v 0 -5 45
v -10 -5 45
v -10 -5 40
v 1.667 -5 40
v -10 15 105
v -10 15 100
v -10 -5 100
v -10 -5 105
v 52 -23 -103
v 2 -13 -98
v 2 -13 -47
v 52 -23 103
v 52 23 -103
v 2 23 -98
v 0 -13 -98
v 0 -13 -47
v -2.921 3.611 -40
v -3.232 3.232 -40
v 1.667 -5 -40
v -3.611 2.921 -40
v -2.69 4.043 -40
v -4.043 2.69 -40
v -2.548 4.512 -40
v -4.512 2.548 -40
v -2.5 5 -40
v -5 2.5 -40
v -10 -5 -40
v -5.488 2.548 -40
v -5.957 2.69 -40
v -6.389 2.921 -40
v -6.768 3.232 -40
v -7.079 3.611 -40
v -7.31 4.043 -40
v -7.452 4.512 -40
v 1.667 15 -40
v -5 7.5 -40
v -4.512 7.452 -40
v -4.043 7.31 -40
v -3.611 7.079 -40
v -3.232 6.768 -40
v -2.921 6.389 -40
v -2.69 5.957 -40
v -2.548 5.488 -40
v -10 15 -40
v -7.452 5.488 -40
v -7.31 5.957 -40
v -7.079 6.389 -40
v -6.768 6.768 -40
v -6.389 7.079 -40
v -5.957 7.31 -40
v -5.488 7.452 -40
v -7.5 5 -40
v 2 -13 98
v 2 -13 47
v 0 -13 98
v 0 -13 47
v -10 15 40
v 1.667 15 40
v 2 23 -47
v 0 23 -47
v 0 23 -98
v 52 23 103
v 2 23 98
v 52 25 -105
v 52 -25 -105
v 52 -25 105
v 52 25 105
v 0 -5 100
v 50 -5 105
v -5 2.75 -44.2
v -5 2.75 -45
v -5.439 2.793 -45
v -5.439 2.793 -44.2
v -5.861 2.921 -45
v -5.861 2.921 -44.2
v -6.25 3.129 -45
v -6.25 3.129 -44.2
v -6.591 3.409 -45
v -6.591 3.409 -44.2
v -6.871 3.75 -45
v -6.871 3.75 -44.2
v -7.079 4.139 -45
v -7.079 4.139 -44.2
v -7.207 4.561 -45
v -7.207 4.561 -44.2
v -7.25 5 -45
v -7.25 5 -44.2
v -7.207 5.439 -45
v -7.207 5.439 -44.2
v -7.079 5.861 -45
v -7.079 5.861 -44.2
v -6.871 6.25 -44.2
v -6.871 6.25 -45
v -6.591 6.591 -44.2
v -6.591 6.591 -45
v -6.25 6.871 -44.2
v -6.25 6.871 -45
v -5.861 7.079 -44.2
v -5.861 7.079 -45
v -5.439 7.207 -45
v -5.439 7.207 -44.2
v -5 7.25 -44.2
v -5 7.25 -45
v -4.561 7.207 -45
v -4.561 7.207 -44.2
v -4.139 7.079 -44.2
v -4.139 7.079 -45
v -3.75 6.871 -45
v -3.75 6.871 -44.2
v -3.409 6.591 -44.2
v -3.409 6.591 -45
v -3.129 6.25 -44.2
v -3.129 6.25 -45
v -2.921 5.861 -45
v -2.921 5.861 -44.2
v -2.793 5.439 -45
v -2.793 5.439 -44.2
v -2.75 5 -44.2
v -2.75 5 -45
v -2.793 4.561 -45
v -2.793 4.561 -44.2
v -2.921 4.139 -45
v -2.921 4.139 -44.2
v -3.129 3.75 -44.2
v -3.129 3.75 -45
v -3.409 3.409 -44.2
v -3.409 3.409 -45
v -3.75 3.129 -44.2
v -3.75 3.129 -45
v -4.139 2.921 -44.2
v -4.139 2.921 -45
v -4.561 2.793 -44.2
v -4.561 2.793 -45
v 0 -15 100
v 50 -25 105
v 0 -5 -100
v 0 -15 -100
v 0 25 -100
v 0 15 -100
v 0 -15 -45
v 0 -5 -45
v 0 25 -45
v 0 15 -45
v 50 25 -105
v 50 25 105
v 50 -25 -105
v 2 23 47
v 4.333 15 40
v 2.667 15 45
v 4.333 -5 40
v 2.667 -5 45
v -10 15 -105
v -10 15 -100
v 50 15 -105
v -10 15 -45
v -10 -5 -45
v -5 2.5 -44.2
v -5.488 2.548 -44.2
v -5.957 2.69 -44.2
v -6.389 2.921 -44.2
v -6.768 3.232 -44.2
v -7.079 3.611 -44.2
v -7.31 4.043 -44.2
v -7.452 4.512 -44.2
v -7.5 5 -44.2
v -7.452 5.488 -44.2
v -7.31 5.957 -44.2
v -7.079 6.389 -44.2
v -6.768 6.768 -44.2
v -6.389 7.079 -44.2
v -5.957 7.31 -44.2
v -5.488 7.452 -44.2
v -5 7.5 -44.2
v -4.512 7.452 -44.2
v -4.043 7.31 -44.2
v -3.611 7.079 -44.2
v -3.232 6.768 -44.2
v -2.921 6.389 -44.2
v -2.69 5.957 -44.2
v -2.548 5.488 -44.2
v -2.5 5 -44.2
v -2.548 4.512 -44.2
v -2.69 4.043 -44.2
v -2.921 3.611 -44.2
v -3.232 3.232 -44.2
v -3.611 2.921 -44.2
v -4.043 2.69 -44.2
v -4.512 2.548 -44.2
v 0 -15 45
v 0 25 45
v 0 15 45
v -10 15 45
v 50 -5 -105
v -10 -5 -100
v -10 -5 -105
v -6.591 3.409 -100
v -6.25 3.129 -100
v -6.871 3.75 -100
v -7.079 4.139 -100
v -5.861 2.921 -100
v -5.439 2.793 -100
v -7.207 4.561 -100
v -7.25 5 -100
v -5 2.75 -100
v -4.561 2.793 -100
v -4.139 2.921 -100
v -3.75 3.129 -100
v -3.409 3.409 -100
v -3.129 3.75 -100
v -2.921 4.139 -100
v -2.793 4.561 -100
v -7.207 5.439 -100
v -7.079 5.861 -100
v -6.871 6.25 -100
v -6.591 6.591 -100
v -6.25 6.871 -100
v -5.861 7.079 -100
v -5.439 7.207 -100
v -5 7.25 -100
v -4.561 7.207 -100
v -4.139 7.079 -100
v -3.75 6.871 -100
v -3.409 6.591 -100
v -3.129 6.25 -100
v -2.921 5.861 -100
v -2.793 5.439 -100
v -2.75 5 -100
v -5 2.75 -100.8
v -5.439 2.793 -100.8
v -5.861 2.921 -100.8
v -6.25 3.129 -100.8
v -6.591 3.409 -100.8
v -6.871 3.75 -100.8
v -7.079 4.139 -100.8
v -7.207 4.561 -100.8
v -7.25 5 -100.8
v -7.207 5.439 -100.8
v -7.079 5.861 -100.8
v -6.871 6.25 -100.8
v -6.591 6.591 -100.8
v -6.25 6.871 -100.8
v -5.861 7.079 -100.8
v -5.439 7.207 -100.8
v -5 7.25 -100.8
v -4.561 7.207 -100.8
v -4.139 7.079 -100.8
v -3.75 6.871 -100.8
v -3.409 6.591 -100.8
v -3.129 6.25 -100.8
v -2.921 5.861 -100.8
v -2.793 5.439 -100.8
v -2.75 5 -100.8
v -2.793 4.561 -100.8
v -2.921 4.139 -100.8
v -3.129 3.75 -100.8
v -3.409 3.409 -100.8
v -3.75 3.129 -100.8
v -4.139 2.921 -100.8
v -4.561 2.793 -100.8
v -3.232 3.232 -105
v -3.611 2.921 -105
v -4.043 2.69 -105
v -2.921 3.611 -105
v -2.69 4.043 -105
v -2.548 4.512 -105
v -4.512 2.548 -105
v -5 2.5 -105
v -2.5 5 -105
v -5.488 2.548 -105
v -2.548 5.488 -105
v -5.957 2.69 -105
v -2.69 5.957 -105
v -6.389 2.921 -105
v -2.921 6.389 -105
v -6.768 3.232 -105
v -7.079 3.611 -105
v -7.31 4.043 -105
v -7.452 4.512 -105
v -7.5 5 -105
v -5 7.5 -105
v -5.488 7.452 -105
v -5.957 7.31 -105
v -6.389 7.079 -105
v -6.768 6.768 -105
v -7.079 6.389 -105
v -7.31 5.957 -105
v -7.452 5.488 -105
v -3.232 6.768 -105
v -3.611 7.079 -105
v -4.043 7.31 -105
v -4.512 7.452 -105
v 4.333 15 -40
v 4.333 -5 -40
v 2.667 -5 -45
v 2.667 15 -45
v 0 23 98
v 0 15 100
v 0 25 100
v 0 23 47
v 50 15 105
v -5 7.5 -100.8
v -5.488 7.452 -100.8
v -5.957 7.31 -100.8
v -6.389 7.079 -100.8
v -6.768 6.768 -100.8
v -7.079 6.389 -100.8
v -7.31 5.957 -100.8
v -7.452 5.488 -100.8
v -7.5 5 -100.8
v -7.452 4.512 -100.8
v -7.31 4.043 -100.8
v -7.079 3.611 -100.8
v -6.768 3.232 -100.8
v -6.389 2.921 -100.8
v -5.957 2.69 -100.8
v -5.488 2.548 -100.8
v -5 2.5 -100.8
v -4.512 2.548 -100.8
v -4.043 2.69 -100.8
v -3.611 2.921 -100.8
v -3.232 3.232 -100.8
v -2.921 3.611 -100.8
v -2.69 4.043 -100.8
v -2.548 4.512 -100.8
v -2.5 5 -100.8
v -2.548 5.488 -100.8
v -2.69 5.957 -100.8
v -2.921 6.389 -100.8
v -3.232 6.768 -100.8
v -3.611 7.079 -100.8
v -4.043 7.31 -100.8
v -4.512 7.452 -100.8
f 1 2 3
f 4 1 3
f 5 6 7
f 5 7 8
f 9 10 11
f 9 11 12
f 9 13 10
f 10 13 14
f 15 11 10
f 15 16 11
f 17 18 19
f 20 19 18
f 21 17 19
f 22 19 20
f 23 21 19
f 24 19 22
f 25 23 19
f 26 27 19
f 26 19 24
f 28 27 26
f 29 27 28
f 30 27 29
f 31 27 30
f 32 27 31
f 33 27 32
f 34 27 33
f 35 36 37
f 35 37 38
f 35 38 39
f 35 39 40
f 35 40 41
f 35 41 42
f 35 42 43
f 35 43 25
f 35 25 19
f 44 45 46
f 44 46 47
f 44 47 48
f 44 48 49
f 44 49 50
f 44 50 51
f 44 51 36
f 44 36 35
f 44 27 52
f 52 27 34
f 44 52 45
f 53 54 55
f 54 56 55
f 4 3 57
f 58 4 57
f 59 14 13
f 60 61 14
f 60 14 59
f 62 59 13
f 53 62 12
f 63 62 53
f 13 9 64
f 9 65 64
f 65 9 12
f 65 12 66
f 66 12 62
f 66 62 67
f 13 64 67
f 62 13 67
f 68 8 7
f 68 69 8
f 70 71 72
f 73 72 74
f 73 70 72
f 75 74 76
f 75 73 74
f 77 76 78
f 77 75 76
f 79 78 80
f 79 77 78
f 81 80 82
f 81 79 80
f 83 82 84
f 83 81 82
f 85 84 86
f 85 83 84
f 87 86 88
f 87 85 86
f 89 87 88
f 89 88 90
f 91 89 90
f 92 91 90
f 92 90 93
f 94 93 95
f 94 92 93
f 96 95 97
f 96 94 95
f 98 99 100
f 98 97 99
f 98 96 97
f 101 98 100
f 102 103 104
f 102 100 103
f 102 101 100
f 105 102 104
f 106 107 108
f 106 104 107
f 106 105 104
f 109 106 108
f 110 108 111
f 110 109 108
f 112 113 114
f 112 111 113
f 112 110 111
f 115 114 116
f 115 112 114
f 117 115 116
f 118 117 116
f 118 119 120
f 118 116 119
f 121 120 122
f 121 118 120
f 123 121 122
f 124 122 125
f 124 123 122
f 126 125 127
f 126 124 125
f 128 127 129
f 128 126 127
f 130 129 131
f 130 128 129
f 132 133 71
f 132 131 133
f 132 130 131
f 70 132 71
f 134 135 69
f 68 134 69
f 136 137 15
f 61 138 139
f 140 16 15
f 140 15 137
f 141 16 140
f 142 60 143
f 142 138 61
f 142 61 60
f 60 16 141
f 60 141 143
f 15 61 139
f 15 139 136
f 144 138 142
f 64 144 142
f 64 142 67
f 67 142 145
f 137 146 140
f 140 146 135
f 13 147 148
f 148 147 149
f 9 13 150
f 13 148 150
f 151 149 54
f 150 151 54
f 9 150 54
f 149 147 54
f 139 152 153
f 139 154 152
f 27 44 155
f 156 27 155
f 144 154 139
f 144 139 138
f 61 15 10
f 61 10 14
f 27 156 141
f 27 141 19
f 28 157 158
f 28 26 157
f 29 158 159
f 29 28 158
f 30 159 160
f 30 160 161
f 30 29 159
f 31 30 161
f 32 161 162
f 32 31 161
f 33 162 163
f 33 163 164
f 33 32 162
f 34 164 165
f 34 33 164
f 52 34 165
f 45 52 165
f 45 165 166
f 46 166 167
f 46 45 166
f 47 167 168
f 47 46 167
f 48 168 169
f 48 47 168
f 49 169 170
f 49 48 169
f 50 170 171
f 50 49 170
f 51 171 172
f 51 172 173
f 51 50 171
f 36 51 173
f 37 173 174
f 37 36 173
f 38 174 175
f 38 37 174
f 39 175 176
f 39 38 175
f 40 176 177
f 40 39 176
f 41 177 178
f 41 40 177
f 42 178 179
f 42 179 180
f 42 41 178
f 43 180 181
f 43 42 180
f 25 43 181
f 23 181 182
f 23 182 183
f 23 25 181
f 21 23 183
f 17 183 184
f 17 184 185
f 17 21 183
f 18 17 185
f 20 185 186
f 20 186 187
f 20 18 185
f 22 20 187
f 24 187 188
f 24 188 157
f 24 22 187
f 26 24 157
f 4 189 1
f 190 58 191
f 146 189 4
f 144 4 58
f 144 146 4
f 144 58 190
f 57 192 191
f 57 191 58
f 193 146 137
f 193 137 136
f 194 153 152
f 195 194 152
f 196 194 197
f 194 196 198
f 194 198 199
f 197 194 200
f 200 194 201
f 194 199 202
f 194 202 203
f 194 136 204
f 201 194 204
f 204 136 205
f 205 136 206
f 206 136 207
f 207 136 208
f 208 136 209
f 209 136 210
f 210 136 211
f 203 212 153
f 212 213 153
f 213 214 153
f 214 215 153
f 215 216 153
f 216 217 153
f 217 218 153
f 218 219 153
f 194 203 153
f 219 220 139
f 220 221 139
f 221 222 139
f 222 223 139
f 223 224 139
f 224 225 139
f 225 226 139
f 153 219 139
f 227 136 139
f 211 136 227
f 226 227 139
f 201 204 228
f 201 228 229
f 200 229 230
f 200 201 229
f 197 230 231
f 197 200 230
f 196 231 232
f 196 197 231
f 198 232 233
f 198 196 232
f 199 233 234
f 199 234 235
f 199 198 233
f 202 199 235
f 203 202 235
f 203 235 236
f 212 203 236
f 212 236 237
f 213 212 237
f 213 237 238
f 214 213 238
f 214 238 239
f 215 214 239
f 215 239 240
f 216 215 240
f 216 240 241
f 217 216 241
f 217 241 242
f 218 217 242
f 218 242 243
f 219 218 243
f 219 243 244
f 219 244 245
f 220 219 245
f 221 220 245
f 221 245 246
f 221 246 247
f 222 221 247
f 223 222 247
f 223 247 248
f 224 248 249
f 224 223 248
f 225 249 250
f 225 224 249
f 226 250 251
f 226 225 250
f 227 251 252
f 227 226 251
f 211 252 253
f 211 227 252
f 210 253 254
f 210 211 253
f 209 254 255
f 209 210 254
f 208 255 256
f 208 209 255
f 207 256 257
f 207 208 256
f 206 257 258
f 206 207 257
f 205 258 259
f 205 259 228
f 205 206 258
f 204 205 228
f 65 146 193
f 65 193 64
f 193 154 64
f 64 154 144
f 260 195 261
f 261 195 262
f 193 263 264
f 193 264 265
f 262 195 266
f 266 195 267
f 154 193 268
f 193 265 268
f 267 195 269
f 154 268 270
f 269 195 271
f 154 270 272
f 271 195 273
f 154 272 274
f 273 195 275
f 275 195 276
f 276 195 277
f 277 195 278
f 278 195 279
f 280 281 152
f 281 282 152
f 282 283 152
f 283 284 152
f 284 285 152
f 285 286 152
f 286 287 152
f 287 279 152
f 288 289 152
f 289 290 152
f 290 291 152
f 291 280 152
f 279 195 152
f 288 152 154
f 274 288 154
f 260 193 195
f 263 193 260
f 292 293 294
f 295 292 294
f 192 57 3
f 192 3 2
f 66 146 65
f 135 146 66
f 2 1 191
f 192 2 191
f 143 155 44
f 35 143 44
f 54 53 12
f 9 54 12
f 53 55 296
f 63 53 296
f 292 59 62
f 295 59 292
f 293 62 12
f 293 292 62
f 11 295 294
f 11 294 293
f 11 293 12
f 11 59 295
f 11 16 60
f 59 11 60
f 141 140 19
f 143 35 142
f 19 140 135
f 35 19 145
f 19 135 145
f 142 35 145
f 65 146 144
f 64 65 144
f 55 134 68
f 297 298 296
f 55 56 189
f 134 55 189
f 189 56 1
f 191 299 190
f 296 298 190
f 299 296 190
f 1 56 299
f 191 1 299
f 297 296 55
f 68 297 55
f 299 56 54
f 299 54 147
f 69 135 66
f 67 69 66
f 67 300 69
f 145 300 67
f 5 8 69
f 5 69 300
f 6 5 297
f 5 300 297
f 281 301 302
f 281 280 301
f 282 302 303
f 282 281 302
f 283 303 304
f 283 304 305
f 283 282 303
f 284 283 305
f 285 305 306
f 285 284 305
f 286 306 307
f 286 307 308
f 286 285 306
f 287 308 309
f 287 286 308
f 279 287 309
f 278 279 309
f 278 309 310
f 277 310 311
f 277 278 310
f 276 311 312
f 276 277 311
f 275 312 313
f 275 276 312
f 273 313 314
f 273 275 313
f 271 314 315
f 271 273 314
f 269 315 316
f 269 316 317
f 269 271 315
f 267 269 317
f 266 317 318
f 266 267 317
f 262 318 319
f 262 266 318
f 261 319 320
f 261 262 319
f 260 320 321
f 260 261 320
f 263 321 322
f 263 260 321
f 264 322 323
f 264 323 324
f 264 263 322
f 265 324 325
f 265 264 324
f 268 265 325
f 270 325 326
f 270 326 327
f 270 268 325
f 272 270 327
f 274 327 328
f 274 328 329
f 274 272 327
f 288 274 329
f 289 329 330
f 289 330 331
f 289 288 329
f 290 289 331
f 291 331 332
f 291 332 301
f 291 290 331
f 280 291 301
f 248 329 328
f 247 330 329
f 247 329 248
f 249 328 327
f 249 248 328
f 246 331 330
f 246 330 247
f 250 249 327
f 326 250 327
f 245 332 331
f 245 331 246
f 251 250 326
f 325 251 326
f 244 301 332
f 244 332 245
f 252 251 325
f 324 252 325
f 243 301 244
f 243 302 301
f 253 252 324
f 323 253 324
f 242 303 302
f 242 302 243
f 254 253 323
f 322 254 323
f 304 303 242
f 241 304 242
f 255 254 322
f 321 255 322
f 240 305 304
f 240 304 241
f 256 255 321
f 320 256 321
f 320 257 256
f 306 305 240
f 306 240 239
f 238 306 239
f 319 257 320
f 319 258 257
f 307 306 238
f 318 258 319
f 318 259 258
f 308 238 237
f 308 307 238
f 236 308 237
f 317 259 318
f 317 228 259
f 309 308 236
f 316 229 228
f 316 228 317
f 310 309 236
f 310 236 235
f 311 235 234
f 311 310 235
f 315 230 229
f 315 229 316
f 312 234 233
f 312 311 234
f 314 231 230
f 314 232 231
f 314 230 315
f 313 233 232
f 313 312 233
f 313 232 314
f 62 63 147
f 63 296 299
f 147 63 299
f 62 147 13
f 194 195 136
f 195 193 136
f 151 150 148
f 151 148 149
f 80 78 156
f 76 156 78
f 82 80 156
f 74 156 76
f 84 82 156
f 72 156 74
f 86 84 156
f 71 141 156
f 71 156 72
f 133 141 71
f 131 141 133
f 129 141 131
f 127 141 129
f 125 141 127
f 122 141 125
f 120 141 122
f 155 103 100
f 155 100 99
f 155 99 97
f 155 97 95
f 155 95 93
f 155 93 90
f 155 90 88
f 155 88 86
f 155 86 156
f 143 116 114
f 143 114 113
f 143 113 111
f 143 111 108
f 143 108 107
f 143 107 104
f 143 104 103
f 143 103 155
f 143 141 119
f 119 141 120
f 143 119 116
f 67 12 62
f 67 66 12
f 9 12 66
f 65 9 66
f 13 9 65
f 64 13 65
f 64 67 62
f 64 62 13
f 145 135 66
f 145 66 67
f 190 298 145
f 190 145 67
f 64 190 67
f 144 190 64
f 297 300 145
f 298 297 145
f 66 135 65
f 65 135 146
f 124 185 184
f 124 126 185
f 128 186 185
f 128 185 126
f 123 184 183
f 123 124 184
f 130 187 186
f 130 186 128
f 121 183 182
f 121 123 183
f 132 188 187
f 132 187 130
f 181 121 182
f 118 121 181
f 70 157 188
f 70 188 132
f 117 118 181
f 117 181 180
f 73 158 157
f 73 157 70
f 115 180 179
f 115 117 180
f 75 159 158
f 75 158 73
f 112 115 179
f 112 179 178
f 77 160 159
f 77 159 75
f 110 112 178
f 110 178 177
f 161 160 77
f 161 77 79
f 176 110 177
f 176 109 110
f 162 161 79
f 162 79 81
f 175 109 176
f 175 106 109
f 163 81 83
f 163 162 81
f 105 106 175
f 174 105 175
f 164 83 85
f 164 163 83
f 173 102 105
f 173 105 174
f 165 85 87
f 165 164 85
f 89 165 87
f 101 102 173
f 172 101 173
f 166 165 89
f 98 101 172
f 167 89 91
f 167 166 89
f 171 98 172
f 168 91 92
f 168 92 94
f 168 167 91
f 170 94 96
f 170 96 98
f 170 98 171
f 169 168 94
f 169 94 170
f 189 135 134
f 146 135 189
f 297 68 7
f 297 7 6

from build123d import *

# Parameters (mm, degrees)
SKETCH1_W             = 210
SKETCH1_H             = 50
SKETCH1_W_2           = 206
SKETCH1_H_2           = 46
BOSS_EXTRUDE3_DEPTH   = 52
SKETCH3_W             = 210
SKETCH3_H             = 50
BOSS_EXTRUDE4_DEPTH   = 2
CHAMFER1_SIZE         = 50
CHAMFER1_SIZE_2       = 5
CHAMFER2_SIZE         = 10
CHAMFER2_SIZE_2       = 50
CHAMFER3_SIZE2        = 150
CHAMFER3_SIZE         = 50
CHAMFER4_SIZE         = 150
CHAMFER4_SIZE2        = 50
CHAMFER5_SIZE         = 10
CHAMFER5_SIZE2        = 50
CHAMFER6_SIZE         = 5
CHAMFER6_SIZE2        = 50
SKETCH4_W             = 51
SKETCH4_H             = 36
CUT_EXTRUDE2_DEPTH    = 2
SKETCH5_W             = 5
SKETCH5_H             = 20
BOSS_EXTRUDE5_DEPTH   = 10
BOSS_EXTRUDE5_2_DEPTH = 10
SKETCH6_W             = 5
SKETCH6_H             = 20
BOSS_EXTRUDE6_DEPTH   = 52
CUT_EXTRUDE3_DEPTH    = 36


# Some blends are built 0.0001 mm under size
with BuildPart() as part:
    # Sketch1 → Boss-Extrude3 (new body)
    with BuildSketch(Plane(origin=(0, 0, 0), x_dir=(0, 0, -1), z_dir=(1, 0, 0))):
        Rectangle(SKETCH1_W, SKETCH1_H)
        Rectangle(SKETCH1_W_2, SKETCH1_H_2, mode=Mode.SUBTRACT)
    extrude(amount=BOSS_EXTRUDE3_DEPTH)

    # Sketch3 → Boss-Extrude4 (add)
    with BuildSketch(Plane.ZY):
        Rectangle(SKETCH3_W, SKETCH3_H)
    extrude(amount=-BOSS_EXTRUDE4_DEPTH)

    # Chamfer1
    # the kernel refuses this chamfer: 50, 5 mm, written as the material it adds along each edge
    with BuildSketch(Plane(origin=(2, 23, 103), x_dir=(0.9999926740665032, 0, 0.0038277687135160926), z_dir=(0, -1, 0))) as chamfer1_piece_1_section:
        Polygon((CHAMFER1_SIZE * 0.999992674067, -CHAMFER1_SIZE * 0.00382776871352), (-CHAMFER1_SIZE_2 * 0.00382776871352, -CHAMFER1_SIZE_2 * 0.999992674067), (0, 0), align=None)
    chamfer1_piece_1 = extrude(amount=46, mode=Mode.PRIVATE)
    chamfer1_piece_1 = split(chamfer1_piece_1, bisect_by=Plane(origin=(52, 0, 101.896942332), z_dir=(-1, 0, 0)), keep=Keep.TOP, mode=Mode.PRIVATE)
    add(chamfer1_piece_1)

    # Chamfer2
    # the kernel refuses this chamfer: 50, 10 mm, written as the material it adds along each edge
    with BuildSketch(Plane(origin=(2, -23, 227.906604315), x_dir=(-0.18544098588999025, 0.9826554028509427, 0), z_dir=(0, 0, -1))) as chamfer2_piece_1_section:
        Polygon((CHAMFER2_SIZE * 0.982655402851, CHAMFER2_SIZE * 0.18544098589), (-CHAMFER2_SIZE_2 * 0.18544098589, CHAMFER2_SIZE_2 * 0.982655402851), (0, 0), align=None)
    chamfer2_piece_1 = extrude(amount=330.906604315, mode=Mode.PRIVATE)
    chamfer2_piece_1 = split(chamfer2_piece_1, bisect_by=Plane(origin=(9.567041137, -20.198584672, 98.756704114), z_dir=(0.09950371902147655, 0, -0.9950371902099414)), keep=Keep.TOP, mode=Mode.PRIVATE)
    chamfer2_piece_1 = split(chamfer2_piece_1, bisect_by=Plane(origin=(52, -20.198584672, -1.619765595), z_dir=(-1, 0, 0)), keep=Keep.TOP, mode=Mode.PRIVATE)
    add(chamfer2_piece_1)

    # Chamfer3
    chamfer3_edges = [part.edges().sort_by_distance(p)[0] for p in [
        (2, 5, -103),
    ]]
    chamfer3_side = [part.faces().sort_by_distance(p)[0] for p in [
        (3, 5, -103),
    ]]
    chamfer(chamfer3_edges, length=CHAMFER3_SIZE - 0.0001, length2=CHAMFER3_SIZE2 - 0.0001, reference=chamfer3_side[0])  # a hair under: the kernel refuses the full size

    # Chamfer4
    chamfer4_edges = [part.edges().sort_by_distance(p)[0] for p in [
        (0, 0, -105),
    ]]
    chamfer4_side = [part.faces().sort_by_distance(p)[0] for p in [
        (0, 0, 0),
    ]]
    chamfer(chamfer4_edges, length=CHAMFER4_SIZE, length2=CHAMFER4_SIZE2, reference=chamfer4_side[0])

    # Chamfer5
    chamfer5_edges = [part.edges().sort_by_distance(p)[0] for p in [
        (0, -25, 75),
    ]]
    chamfer5_side = [part.faces().sort_by_distance(p)[0] for p in [
        (0, 0, 75),
    ]]
    chamfer(chamfer5_edges, length=CHAMFER5_SIZE, length2=CHAMFER5_SIZE2, reference=chamfer5_side[0])

    # Chamfer6
    chamfer6_edges = [part.edges().sort_by_distance(p)[0] for p in [
        (0, 5, 105),
    ]]
    chamfer6_side = [part.faces().sort_by_distance(p)[0] for p in [
        (0, 5, 75),
    ]]
    chamfer(chamfer6_edges, length=CHAMFER6_SIZE, length2=CHAMFER6_SIZE2, reference=chamfer6_side[0])

    # Sketch4 → Cut-Extrude2 (cut)
    with BuildSketch(Plane.ZY):
        with Locations((72.5, 5)):
            Rectangle(SKETCH4_W, SKETCH4_H)
    extrude(amount=-CUT_EXTRUDE2_DEPTH, mode=Mode.SUBTRACT)



with BuildPart() as body_2:
    # Sketch5 → Boss-Extrude5 (new body)
    with BuildSketch(Plane.ZY):
        with Locations((102.5, 5)):
            Rectangle(SKETCH5_W, SKETCH5_H)
    extrude(amount=BOSS_EXTRUDE5_DEPTH)


with BuildPart() as body_3:
    # Sketch5 → Boss-Extrude5 2 (new body)
    with BuildSketch(Plane.ZY):
        with Locations((42.5, 5)):
            Rectangle(SKETCH5_W, SKETCH5_H)
    extrude(amount=BOSS_EXTRUDE5_2_DEPTH)


with BuildPart() as part_1:
    add(part.part)

    add(body_2.part)  # Boss-Extrude6 merges body 2

    add(body_3.part)  # Boss-Extrude6 merges body 3
    # Sketch6 → Boss-Extrude6 (add)
    with BuildSketch(Plane(origin=(0, 0, 0), x_dir=(0, 0, -1), z_dir=(1, 0, 0))):
        with Locations((-42.5, 5)):
            Rectangle(SKETCH6_W, SKETCH6_H)
        with Locations((-102.5, 5)):
            Rectangle(SKETCH6_W, SKETCH6_H)
    extrude(amount=BOSS_EXTRUDE6_DEPTH)

    # Sketch7 → Cut-Extrude3 (cut)
    with BuildSketch(Plane(origin=(0, -13, 0), x_dir=(1, 0, 0), z_dir=(0, 1, 0))):
        Polygon((52, -103), (52, 103), (2, -47), (2, -98), align=None)
    extrude(amount=CUT_EXTRUDE3_DEPTH, mode=Mode.SUBTRACT)


with BuildPart() as body_2_2:
    # Mirror1: mirrored copy
    add(part_1.part.mirror(Plane.XY))

    # Sketch12 → CBORE for M5 Hex Head Bolt2 (revolve, cut)
    with BuildSketch(Plane(origin=(-5, 5, -40), x_dir=(0, -1, 0), z_dir=(1, 0, 0))):
        Polygon((0, 0), (0, 65), (2.25, 65), (2.25, 4.2), (2.5, 4.2), (2.5, 0), align=None)
    revolve(axis=Axis((-5, 5, -33.65), (0, 0, -1)), mode=Mode.SUBTRACT)

    # Sketch14 → CBORE for M5 Hex Head Bolt3 (revolve, cut)
    with BuildSketch(Plane(origin=(-5, 5, -105), x_dir=(0, 1, 0), z_dir=(1, 0, 0))):
        Polygon((0, 0), (0, 210), (2.25, 210), (2.25, 4.2), (2.5, 4.2), (2.5, 0), align=None)
    revolve(axis=Axis((-5, 5, -111.35), (0, 0, 1)), mode=Mode.SUBTRACT)


solid = Compound([part_1.part, body_2_2.part])
